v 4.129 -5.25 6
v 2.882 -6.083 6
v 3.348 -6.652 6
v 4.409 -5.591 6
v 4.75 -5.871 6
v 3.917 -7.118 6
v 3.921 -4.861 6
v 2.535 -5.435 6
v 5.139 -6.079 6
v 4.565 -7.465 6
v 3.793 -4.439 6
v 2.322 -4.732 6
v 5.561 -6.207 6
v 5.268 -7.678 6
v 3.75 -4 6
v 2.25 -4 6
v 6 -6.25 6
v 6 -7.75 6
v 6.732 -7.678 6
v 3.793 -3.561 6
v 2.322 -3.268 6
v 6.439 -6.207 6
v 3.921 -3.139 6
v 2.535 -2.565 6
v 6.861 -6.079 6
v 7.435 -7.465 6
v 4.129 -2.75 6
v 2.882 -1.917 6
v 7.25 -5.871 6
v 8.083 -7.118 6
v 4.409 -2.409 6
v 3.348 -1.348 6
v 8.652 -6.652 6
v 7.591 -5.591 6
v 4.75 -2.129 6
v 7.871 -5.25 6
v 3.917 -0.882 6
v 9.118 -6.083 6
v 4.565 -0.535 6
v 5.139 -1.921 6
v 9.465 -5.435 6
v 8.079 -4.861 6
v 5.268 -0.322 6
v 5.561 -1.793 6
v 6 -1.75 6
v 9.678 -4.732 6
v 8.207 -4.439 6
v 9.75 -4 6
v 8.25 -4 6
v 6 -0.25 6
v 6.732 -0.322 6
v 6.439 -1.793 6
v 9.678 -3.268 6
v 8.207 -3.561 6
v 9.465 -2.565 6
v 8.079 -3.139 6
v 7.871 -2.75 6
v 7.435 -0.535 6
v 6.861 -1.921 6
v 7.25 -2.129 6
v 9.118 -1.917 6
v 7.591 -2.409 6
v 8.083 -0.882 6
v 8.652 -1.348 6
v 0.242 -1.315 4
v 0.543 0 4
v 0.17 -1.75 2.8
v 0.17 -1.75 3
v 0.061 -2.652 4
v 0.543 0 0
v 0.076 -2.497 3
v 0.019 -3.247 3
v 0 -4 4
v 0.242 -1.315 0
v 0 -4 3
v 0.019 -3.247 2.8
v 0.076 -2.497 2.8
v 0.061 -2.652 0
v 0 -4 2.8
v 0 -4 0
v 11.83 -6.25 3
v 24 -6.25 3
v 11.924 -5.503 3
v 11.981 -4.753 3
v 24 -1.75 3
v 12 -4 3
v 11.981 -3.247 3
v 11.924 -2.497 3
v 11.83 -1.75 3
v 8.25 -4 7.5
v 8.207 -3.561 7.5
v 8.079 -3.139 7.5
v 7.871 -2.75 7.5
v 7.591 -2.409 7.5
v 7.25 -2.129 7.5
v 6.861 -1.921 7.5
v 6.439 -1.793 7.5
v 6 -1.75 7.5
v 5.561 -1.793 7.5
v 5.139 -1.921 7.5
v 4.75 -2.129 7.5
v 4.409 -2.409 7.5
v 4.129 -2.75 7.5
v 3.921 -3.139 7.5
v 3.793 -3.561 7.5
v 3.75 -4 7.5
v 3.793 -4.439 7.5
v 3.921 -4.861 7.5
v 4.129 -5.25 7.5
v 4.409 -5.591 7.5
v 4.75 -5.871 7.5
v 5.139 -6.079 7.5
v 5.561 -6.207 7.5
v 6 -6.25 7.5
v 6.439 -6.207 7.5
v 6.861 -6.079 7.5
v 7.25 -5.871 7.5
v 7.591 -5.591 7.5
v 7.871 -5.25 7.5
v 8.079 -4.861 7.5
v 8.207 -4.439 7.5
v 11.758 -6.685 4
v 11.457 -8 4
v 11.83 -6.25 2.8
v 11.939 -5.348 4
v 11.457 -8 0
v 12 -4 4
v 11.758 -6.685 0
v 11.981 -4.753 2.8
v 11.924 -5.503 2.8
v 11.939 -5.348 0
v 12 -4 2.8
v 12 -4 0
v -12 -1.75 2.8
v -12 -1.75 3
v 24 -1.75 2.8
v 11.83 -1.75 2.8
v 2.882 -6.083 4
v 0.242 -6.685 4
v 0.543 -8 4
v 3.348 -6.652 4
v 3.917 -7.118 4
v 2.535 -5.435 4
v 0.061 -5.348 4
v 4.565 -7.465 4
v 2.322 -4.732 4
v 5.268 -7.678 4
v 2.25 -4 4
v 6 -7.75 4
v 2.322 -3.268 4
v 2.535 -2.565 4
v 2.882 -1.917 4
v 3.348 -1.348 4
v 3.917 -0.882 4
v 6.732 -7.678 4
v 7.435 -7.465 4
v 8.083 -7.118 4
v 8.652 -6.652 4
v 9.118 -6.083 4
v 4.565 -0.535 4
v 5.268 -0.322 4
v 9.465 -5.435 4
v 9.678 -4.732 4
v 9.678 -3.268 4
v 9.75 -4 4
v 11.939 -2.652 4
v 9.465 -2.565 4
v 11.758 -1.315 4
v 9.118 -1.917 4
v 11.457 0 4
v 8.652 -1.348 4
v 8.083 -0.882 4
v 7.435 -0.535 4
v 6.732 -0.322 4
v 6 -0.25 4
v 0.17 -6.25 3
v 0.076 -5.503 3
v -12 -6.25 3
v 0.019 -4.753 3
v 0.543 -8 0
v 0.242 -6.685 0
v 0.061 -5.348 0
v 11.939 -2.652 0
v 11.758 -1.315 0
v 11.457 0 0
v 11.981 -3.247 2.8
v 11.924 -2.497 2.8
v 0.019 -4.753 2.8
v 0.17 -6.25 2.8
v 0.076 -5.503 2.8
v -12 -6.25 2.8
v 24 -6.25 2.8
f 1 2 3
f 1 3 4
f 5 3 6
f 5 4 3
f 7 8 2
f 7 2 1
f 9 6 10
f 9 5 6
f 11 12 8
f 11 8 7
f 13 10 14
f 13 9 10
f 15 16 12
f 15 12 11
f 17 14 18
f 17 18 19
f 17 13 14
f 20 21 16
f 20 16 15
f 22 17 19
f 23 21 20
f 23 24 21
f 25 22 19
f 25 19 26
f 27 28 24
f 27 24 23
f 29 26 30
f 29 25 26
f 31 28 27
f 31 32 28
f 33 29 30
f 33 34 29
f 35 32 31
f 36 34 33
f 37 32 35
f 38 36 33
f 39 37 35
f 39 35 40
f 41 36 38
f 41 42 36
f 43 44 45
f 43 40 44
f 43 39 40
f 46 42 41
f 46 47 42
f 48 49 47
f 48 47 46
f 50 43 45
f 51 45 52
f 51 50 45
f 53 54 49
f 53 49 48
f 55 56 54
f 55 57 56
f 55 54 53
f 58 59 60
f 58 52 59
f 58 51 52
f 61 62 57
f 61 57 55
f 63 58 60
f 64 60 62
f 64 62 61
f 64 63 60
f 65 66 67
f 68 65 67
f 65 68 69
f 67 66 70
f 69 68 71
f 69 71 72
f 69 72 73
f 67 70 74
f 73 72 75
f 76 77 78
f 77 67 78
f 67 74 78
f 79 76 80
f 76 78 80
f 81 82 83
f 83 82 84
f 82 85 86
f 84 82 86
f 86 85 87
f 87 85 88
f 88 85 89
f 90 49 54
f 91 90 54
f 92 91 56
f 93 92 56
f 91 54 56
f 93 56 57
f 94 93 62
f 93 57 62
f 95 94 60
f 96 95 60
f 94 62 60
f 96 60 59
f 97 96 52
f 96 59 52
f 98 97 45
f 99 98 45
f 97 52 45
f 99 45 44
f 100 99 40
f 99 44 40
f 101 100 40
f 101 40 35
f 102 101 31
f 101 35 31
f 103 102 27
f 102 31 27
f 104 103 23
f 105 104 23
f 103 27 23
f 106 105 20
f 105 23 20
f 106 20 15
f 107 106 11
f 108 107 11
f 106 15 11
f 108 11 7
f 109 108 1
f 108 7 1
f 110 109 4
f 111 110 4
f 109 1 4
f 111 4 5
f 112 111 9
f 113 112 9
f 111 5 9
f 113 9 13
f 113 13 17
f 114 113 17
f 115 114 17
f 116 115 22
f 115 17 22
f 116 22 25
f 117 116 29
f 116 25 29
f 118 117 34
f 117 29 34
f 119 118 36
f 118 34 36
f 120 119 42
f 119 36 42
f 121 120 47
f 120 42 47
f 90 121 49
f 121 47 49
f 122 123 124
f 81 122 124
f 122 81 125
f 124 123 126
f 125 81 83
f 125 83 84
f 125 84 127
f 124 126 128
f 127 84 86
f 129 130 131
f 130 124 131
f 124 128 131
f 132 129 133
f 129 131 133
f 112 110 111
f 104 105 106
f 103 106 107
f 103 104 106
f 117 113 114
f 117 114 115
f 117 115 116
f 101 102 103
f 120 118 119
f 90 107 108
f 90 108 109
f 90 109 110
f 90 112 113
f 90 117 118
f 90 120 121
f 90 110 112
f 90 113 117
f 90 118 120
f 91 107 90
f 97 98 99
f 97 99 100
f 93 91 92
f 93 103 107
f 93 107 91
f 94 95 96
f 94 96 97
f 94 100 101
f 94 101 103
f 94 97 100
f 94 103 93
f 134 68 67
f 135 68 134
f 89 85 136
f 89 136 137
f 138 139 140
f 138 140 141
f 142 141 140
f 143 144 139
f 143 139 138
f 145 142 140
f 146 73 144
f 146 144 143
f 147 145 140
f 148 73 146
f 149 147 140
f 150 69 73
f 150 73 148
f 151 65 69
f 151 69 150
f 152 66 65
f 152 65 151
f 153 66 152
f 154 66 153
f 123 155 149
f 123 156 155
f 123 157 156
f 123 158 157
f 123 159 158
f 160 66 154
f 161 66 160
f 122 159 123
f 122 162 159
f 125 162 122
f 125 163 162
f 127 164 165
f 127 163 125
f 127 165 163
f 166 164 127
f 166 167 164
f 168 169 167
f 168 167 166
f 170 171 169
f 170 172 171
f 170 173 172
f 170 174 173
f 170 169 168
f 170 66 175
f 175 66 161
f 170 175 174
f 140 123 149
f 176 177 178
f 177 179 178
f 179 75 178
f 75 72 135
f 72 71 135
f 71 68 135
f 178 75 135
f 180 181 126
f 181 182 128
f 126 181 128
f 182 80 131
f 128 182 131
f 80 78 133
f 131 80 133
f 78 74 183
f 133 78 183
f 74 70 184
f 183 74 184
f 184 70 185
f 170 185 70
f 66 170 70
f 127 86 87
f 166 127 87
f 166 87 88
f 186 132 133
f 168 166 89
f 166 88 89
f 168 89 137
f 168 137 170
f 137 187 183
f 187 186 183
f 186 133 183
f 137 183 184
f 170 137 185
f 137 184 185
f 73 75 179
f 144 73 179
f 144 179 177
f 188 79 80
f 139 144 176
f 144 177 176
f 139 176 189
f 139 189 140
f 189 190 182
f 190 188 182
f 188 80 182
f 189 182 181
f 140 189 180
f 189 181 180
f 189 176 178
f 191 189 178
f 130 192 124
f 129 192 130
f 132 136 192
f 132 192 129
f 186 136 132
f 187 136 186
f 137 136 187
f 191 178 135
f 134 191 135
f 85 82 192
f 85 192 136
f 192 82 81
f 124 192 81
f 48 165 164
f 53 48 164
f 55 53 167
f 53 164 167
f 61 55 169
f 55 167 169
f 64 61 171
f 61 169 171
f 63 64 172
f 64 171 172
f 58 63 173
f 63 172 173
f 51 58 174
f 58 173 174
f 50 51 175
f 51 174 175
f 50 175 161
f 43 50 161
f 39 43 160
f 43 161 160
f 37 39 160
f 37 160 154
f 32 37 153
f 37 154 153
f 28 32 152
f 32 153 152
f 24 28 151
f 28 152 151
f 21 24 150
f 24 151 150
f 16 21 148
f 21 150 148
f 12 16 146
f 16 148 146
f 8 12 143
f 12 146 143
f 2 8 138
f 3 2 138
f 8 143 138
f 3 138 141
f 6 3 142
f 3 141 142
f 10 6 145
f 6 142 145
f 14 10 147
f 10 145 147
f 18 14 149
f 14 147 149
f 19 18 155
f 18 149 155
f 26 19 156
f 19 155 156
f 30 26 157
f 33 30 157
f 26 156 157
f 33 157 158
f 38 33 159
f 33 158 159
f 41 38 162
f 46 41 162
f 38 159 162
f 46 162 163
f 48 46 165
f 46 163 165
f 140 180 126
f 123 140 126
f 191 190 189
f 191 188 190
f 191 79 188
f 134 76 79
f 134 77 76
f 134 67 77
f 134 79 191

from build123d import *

# Parameters (mm, degrees)
EXTRUDE_1_DEPTH = 4
SKETCH_2_R      = 3.75
EXTRUDE_2_DEPTH = 2
SKETCH_3_R      = 2.25
EXTRUDE_3_DEPTH = 1.5
SKETCH_4_W      = 36
SKETCH_4_H      = 4.5
EXTRUDE_4_DEPTH = 0.2


with BuildPart() as part:
    # Эскиз1 → Бобышка-Вытянуть1 (new body)
    with BuildSketch(Plane.XY):
        with BuildLine():
            Line((11.456832295, 0), (6, 0))
            Line((6, 0), (6, -8))
            Line((6, -8), (11.456832295, -8))
            ThreePointArc((11.456832295, -8), (11.863587803, -6.01835518), (12, -3.999999921))
            ThreePointArc((12, -3.999999921), (11.863587792, -1.981644742), (11.456832295, 0))
        make_face()
        with BuildLine():
            Line((6, -8), (6, 0))
            Line((6, 0), (0.543167705, 0))
            ThreePointArc((0.543167705, 0), (0.136412203, -1.981644781), (0, -4))
            ThreePointArc((0, -4), (0.136412203, -6.018355219), (0.543167705, -8))
            Line((0.543167705, -8), (6, -8))
        make_face()
    extrude(amount=EXTRUDE_1_DEPTH)

    # Эскиз2 → Бобышка-Вытянуть2 (add)
    with BuildSketch(Plane.XY.offset(4)):
        with Locations((6, -4)):
            Circle(SKETCH_2_R)
    extrude(amount=EXTRUDE_2_DEPTH)

    # Эскиз3 → Бобышка-Вытянуть3 (add)
    with BuildSketch(Plane.XY.offset(6)):
        with Locations((6, -4)):
            Circle(SKETCH_3_R)
    extrude(amount=EXTRUDE_3_DEPTH)

    # Эскиз4 → Бобышка-Вытянуть4 (add)
    with BuildSketch(Plane(origin=(0, 0, 3), x_dir=(-1, 0, 0), z_dir=(0, 0, -1))):
        with Locations((-6, -4)):
            Rectangle(SKETCH_4_W, SKETCH_4_H)
    extrude(amount=EXTRUDE_4_DEPTH)


solid = part.part
